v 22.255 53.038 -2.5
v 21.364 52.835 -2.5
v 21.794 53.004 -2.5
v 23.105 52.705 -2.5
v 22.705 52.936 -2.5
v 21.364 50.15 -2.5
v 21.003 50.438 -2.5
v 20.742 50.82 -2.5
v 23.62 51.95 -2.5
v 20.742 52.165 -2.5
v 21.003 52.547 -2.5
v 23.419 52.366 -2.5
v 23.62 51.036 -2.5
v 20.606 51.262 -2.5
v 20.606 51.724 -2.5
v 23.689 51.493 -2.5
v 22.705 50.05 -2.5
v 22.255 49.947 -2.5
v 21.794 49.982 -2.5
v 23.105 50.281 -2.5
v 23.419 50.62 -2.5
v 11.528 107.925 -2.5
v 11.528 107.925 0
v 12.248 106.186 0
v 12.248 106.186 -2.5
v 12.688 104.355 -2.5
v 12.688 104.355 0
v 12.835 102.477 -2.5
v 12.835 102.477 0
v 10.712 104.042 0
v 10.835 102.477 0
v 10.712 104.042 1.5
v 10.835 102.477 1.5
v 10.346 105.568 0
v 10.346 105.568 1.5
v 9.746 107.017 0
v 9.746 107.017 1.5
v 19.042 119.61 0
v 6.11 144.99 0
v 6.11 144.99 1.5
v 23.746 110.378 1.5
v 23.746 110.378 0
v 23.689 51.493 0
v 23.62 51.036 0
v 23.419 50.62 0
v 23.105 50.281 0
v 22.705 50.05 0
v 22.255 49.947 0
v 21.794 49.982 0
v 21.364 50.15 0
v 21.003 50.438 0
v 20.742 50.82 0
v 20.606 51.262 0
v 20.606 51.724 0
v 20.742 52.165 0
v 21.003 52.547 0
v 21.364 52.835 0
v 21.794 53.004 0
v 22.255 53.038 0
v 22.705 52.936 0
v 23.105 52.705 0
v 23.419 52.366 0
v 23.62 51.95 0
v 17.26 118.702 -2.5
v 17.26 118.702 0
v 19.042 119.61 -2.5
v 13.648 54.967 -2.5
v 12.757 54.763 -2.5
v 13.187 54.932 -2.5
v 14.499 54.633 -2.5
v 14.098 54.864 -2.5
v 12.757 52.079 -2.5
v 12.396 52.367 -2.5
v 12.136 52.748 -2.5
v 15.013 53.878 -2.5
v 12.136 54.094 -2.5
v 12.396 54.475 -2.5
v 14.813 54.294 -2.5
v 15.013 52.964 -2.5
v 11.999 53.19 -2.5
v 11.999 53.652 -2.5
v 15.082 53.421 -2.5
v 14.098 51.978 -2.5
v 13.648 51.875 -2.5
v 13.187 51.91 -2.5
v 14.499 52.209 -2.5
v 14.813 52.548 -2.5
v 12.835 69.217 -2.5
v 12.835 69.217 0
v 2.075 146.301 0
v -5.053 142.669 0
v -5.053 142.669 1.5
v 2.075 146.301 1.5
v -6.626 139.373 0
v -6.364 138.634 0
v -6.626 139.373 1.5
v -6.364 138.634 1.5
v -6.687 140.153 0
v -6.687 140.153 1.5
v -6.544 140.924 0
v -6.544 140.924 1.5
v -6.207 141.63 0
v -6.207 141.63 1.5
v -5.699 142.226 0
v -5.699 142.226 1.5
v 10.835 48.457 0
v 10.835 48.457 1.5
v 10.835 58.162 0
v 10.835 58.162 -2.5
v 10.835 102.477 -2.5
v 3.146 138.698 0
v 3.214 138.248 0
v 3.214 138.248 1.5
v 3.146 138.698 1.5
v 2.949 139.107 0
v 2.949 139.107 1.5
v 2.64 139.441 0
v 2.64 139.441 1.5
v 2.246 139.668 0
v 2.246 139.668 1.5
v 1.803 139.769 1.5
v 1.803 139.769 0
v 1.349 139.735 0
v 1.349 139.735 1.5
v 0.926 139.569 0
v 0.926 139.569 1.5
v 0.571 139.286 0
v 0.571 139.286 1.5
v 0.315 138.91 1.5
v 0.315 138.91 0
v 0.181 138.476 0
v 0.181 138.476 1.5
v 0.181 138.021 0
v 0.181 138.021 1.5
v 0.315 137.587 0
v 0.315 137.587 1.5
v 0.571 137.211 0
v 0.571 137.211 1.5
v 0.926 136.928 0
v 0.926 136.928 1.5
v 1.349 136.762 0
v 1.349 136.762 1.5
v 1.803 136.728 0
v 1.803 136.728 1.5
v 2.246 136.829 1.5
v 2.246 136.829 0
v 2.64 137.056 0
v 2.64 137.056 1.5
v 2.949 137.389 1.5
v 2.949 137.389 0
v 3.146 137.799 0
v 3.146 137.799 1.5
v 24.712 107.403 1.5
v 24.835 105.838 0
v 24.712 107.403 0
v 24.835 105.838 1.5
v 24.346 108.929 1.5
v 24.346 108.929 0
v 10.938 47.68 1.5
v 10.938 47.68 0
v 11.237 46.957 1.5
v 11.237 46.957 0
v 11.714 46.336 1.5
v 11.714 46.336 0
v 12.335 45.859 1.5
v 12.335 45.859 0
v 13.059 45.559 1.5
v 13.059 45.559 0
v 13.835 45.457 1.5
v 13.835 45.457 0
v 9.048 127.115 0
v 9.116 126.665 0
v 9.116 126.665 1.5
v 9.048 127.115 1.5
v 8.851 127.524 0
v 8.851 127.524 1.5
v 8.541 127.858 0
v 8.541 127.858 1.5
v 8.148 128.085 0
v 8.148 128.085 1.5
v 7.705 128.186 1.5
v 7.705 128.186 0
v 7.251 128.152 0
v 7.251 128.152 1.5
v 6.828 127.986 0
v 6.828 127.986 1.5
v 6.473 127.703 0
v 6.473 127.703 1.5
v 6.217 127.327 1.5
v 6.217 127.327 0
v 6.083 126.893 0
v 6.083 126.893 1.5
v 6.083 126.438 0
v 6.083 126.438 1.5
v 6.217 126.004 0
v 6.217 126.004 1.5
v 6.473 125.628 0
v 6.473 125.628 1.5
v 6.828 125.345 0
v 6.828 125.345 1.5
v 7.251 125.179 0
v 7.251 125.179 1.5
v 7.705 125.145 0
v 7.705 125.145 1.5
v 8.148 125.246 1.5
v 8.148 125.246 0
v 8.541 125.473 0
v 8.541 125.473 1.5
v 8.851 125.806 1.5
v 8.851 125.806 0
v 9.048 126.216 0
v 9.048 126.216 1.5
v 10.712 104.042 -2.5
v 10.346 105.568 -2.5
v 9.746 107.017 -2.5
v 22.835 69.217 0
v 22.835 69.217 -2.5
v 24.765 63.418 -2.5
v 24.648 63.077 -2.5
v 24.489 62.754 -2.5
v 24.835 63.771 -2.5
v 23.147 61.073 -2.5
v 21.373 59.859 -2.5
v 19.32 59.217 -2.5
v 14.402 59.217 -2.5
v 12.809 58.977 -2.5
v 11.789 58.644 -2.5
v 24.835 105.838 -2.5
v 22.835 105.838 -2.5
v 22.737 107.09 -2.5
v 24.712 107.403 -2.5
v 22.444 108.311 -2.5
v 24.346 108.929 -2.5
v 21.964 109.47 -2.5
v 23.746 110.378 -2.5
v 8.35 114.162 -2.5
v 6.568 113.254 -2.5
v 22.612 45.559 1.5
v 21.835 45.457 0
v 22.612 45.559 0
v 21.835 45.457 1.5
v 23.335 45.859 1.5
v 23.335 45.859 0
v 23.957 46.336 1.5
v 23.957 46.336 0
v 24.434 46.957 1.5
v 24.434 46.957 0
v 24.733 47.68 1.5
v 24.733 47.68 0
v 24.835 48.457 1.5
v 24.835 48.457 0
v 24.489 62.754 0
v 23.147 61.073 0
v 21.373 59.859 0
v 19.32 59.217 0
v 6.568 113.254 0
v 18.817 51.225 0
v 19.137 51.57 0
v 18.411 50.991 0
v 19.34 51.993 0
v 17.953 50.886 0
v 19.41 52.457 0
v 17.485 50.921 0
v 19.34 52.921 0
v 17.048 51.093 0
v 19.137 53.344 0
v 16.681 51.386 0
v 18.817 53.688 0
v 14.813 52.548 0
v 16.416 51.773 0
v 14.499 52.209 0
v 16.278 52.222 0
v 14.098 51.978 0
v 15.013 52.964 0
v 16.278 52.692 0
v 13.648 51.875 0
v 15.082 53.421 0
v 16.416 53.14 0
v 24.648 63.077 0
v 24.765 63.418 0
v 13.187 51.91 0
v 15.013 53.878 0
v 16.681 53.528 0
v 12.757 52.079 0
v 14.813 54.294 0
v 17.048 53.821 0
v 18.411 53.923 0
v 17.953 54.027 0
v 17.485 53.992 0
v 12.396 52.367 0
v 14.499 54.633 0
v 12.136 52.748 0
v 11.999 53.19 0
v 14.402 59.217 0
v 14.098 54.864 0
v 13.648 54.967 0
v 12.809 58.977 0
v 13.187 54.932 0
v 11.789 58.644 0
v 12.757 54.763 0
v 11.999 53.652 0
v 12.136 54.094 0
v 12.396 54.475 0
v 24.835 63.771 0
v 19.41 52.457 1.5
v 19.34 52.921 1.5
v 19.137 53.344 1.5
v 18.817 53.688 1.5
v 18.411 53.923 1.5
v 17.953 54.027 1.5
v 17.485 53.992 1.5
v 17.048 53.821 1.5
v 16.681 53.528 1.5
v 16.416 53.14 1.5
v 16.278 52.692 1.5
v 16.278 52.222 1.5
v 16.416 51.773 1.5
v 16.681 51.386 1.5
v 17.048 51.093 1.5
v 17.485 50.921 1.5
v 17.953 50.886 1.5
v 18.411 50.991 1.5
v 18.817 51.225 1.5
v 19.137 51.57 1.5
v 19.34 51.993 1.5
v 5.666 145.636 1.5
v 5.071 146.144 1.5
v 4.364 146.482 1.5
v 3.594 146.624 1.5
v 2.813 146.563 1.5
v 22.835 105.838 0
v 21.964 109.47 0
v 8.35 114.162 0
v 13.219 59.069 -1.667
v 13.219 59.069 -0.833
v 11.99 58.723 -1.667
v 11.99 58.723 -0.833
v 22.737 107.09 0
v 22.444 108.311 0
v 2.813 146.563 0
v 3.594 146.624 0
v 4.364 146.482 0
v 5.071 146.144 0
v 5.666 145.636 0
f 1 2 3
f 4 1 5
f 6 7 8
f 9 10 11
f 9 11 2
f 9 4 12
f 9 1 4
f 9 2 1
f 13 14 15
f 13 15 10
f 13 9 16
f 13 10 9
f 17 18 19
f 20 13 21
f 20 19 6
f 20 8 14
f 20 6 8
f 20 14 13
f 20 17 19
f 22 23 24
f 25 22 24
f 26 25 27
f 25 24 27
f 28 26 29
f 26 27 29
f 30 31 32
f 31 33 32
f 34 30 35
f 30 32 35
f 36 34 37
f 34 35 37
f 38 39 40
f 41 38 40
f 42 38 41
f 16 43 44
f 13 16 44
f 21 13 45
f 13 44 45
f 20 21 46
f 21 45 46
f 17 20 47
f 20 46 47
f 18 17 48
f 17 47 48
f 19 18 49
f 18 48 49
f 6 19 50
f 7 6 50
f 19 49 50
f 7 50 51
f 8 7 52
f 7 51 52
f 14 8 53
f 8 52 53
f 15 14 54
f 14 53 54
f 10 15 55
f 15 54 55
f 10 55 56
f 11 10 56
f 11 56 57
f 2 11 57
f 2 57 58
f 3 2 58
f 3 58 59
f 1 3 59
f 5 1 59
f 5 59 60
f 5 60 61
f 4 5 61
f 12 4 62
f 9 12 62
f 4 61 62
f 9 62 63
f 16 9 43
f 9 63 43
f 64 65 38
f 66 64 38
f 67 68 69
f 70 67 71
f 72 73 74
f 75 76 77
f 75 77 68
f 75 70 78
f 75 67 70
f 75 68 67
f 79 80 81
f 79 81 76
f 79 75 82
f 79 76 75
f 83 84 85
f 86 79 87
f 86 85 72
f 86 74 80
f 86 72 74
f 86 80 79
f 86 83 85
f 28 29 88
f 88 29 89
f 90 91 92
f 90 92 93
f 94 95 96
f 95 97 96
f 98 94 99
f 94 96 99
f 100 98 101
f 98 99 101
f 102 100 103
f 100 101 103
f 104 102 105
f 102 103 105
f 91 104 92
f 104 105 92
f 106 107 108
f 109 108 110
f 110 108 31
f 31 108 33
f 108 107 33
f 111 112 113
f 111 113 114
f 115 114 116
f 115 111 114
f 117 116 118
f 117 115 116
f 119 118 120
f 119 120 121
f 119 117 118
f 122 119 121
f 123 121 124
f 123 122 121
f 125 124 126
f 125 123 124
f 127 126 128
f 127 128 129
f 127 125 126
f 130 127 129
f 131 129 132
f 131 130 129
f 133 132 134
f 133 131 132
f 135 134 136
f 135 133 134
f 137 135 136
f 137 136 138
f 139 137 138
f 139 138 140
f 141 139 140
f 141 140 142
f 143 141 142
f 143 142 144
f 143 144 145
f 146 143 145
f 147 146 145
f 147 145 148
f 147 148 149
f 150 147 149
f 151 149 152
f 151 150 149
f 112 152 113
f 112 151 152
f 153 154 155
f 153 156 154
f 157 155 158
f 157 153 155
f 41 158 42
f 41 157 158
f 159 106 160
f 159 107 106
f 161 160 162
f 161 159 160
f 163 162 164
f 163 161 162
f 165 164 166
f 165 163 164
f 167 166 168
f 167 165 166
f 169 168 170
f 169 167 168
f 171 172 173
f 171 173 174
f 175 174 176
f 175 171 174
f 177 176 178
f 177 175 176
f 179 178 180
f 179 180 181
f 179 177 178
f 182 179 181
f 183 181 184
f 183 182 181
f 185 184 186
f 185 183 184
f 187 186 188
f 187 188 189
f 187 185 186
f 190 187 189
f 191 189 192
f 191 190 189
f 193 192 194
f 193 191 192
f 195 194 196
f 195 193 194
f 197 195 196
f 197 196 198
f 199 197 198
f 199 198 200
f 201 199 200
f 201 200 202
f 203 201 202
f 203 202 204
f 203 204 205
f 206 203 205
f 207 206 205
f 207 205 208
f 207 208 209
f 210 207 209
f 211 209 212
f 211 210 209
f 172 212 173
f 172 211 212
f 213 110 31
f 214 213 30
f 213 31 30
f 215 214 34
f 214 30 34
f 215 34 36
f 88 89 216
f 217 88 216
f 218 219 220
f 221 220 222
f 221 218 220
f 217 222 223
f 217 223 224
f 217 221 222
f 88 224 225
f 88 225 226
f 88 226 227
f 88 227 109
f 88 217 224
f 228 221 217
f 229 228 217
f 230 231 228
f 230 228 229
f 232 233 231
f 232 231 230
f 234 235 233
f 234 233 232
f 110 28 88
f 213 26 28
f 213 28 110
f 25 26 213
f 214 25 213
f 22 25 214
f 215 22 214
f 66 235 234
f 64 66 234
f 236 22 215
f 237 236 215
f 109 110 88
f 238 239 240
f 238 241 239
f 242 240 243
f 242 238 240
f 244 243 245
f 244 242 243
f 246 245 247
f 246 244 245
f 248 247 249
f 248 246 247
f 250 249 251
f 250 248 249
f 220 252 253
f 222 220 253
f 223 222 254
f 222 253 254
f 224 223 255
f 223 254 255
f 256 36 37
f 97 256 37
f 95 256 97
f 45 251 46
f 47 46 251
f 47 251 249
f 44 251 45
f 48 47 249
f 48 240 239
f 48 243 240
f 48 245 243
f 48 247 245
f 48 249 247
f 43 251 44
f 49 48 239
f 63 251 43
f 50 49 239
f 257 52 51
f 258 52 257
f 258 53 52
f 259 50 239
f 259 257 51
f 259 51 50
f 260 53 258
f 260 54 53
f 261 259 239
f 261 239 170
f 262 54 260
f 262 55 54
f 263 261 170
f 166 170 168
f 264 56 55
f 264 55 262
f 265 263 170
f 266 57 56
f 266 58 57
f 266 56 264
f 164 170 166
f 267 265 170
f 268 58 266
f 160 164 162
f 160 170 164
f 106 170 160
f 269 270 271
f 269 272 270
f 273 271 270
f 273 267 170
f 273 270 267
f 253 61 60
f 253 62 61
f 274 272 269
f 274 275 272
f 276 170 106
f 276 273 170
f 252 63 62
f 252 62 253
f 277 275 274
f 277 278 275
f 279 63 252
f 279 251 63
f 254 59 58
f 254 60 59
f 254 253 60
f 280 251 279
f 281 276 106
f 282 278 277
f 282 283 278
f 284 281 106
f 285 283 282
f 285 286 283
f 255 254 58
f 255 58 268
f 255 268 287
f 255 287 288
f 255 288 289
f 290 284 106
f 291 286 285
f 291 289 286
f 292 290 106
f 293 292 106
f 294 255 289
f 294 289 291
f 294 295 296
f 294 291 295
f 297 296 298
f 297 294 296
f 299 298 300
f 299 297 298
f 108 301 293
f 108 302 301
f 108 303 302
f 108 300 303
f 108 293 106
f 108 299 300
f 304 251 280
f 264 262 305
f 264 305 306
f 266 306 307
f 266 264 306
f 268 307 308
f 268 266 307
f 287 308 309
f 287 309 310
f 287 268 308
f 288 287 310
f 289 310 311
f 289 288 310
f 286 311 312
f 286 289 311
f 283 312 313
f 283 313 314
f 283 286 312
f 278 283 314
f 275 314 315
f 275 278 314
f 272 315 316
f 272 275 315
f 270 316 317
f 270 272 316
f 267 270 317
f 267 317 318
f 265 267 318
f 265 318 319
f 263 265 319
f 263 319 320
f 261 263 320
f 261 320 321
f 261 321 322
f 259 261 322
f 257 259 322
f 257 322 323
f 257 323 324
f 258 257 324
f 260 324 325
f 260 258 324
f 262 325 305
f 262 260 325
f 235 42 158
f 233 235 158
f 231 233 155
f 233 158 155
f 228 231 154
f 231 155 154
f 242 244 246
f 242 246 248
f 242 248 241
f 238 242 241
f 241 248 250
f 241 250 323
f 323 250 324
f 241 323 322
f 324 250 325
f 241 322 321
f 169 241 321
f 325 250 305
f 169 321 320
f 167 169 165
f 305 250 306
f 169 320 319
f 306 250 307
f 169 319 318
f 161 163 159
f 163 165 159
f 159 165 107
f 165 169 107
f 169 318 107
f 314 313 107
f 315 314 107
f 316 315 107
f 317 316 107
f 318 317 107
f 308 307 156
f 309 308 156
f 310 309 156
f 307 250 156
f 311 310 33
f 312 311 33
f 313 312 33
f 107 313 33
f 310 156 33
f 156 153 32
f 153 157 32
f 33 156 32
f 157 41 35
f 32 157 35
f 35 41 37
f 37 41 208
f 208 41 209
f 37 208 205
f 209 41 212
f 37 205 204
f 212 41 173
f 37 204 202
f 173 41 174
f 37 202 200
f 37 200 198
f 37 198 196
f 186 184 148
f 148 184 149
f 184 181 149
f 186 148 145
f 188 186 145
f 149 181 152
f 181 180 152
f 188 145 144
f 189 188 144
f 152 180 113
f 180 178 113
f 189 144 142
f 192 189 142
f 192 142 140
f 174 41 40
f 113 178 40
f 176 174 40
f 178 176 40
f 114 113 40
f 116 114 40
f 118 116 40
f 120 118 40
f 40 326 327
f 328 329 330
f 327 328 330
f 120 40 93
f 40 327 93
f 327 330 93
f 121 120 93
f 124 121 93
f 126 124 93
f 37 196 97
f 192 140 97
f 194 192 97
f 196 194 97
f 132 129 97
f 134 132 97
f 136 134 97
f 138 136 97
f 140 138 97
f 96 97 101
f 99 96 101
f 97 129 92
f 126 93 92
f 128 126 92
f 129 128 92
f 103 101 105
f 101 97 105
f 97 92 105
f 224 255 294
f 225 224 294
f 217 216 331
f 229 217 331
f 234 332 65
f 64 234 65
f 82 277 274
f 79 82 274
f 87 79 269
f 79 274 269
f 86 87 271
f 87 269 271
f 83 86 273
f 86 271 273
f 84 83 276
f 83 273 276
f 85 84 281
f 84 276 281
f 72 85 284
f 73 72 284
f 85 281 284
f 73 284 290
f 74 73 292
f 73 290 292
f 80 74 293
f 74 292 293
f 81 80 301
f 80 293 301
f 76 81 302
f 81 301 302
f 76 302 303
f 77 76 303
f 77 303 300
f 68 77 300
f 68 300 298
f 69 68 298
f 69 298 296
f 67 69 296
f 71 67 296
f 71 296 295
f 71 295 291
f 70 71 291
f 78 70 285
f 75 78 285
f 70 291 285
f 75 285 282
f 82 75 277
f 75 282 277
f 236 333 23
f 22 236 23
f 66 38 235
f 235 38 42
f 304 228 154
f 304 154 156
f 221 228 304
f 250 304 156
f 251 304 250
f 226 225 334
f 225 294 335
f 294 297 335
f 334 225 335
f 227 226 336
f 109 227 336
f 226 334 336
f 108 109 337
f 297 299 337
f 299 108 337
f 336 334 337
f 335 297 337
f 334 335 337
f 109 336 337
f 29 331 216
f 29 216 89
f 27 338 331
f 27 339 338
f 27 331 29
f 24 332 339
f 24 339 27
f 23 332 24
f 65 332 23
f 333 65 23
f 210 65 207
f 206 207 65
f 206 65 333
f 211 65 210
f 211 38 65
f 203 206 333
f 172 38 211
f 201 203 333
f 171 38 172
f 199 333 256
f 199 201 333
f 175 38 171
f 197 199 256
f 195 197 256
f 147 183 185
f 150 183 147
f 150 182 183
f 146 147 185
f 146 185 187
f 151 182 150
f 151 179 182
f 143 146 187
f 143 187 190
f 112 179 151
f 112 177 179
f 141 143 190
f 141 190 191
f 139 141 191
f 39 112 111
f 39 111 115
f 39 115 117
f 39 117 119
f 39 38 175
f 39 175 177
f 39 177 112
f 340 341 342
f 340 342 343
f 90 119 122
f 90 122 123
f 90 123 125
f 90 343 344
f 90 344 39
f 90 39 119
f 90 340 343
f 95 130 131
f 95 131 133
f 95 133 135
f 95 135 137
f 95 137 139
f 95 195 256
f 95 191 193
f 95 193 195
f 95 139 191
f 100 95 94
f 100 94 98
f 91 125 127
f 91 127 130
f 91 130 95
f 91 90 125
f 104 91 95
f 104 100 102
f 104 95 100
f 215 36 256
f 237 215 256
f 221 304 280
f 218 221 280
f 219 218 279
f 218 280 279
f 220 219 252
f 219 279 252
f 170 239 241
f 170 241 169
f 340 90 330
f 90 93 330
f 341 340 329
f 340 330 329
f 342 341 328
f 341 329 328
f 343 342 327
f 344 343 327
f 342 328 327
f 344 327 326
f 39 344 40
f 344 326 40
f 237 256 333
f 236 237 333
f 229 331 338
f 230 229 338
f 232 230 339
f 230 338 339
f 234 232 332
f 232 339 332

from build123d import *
from OCP.BRepFilletAPI import BRepFilletAPI_MakeFillet

# Parameters (mm, degrees)
SCHIZZO2_R                   = 1.575
SCHIZZO2_R_2                 = 1.525
ESTRUSIONE_ESTRUSIONE1_DEPTH = 1.5
RACCORDO1_R1                 = 3
RACCORDO1_R2                 = 10
SCHIZZO4_R                   = 1.55
ESTRUSIONE_ESTRUSIONE2_DEPTH = 2.5
ESTRUSIONE_ESTRUSIONE3_DEPTH = 2.5


with BuildPart() as part:
    # Schizzo2 → Estrusione-Estrusione1 (new body)
    with BuildSketch(Plane.XY):
        Polygon((10.835450111, 45.456844872), (10.835450111, 104.878132603), (-7.726239407, 141.30749945), (4.747851932, 147.663366447), (24.835450111, 108.23923523), (24.835450111, 45.456844872), align=None)
        with Locations((17.835450111, 52.456844872)):
            Circle(SCHIZZO2_R, mode=Mode.SUBTRACT)
        with Locations((1.688739761, 138.248387279)):
            Circle(SCHIZZO2_R_2, mode=Mode.SUBTRACT)
        with Locations((7.590616257, 126.665302465)):
            Circle(SCHIZZO2_R_2, mode=Mode.SUBTRACT)
    extrude(amount=ESTRUSIONE_ESTRUSIONE1_DEPTH)

    # Raccordo1: one fillet with a radius per group of edges: ONE call of the kernel's fillet builder (fillet() takes one radius for all edges)
    raccordo1_edges_1 = [part.edges().sort_by_distance(p)[0] for p in [
        (4.747851932, 147.663366447, 0.75),
        (-7.726239407, 141.30749945, 0.75),
        (10.835450111, 45.456844872, 0.75),
        (24.835450111, 45.456844872, 0.75),
    ]]
    raccordo1_edges_2 = [part.edges().sort_by_distance(p)[0] for p in [
        (24.835450111, 108.23923523, 0.75),
        (10.835450111, 104.878132603, 0.75),
    ]]
    raccordo1 = BRepFilletAPI_MakeFillet(part.part.solid().wrapped)
    for e in raccordo1_edges_1:
        raccordo1.Add(RACCORDO1_R1, e.wrapped)
    for e in raccordo1_edges_2:
        raccordo1.Add(RACCORDO1_R2, e.wrapped)
    add(Compound.cast(raccordo1.Shape()), mode=Mode.REPLACE)

    # Schizzo4 → Estrusione-Estrusione2 (add)
    with BuildSketch(Plane(origin=(0, 0, 0), x_dir=(-1, 0, 0), z_dir=(0, 0, -1))):
        with Locations(Location((-13.532140626, 53.421016786, 0), (0, 0, 180))):
            Circle(SCHIZZO4_R)
        with Locations(Location((-22.138759596, 51.492672958, 0), (0, 0, 180))):
            Circle(SCHIZZO4_R)
    extrude(amount=ESTRUSIONE_ESTRUSIONE2_DEPTH)

    # Schizzo5 → Estrusione-Estrusione3 (add)
    with BuildSketch(Plane(origin=(0, 0, 0), x_dir=(-1, 0, 0), z_dir=(0, 0, -1))):
        with BuildLine():
            Line((-24.835450111, 63.770542244), (-19.320054404, 59.217112451))
            Line((-19.320054404, 59.217112451), (-14.402001203, 59.217112451))
            add(Edge.make_bspline(
                [(-14.402001203, 59.217112451), (-13.28177849, 59.164141407), (-11.913165696, 58.833942628), (-10.835450111, 58.162340852)],
                knots=[0, 0, 0, 0, 0.33692331, 0.33692331, 0.33692331, 0.33692331], degree=3))
            Line((-10.835450111, 58.162340852), (-10.835450111, 102.477345012))
            ThreePointArc((-10.835450111, 102.477345012), (-10.559149315, 104.811798651), (-9.745515353, 107.01725001))
            Line((-9.745515353, 107.01725001), (-6.567581855, 113.254295679))
            Line((-6.567581855, 113.254295679), (-8.349594903, 114.162276678))
            Line((-8.349594903, 114.162276678), (-11.527528401, 107.925231009))
            ThreePointArc((-11.527528401, 107.925231009), (-12.503889156, 105.278689378), (-12.835450111, 102.477345012))
            Line((-12.835450111, 102.477345012), (-12.835450111, 69.217112451))
            Line((-12.835450111, 69.217112451), (-22.835450111, 69.217112451))
            Line((-22.835450111, 69.217112451), (-22.835450111, 105.838447639))
            ThreePointArc((-22.835450111, 105.838447639), (-22.614409474, 107.70601055), (-21.963502304, 109.470371637))
            Line((-21.963502304, 109.470371637), (-17.259660145, 118.702181676))
            Line((-17.259660145, 118.702181676), (-19.041673193, 119.610162675))
            Line((-19.041673193, 119.610162675), (-23.745515353, 110.378352637))
            ThreePointArc((-23.745515353, 110.378352637), (-24.559149315, 108.172901278), (-24.835450111, 105.838447639))
            Line((-24.835450111, 105.838447639), (-24.835450111, 63.770542244))
        make_face()
        with BuildLine():
            Line((-19.320054404, 59.217112451), (-24.835450111, 63.770542244))
            ThreePointArc((-24.835450111, 63.770542244), (-24.711960876, 63.245404245), (-24.488566128, 62.75437034))
            ThreePointArc((-24.488566128, 62.75437034), (-22.305073607, 60.400160674), (-19.320054404, 59.217112451))
        make_face()
    extrude(amount=ESTRUSIONE_ESTRUSIONE3_DEPTH)


solid = part.part
